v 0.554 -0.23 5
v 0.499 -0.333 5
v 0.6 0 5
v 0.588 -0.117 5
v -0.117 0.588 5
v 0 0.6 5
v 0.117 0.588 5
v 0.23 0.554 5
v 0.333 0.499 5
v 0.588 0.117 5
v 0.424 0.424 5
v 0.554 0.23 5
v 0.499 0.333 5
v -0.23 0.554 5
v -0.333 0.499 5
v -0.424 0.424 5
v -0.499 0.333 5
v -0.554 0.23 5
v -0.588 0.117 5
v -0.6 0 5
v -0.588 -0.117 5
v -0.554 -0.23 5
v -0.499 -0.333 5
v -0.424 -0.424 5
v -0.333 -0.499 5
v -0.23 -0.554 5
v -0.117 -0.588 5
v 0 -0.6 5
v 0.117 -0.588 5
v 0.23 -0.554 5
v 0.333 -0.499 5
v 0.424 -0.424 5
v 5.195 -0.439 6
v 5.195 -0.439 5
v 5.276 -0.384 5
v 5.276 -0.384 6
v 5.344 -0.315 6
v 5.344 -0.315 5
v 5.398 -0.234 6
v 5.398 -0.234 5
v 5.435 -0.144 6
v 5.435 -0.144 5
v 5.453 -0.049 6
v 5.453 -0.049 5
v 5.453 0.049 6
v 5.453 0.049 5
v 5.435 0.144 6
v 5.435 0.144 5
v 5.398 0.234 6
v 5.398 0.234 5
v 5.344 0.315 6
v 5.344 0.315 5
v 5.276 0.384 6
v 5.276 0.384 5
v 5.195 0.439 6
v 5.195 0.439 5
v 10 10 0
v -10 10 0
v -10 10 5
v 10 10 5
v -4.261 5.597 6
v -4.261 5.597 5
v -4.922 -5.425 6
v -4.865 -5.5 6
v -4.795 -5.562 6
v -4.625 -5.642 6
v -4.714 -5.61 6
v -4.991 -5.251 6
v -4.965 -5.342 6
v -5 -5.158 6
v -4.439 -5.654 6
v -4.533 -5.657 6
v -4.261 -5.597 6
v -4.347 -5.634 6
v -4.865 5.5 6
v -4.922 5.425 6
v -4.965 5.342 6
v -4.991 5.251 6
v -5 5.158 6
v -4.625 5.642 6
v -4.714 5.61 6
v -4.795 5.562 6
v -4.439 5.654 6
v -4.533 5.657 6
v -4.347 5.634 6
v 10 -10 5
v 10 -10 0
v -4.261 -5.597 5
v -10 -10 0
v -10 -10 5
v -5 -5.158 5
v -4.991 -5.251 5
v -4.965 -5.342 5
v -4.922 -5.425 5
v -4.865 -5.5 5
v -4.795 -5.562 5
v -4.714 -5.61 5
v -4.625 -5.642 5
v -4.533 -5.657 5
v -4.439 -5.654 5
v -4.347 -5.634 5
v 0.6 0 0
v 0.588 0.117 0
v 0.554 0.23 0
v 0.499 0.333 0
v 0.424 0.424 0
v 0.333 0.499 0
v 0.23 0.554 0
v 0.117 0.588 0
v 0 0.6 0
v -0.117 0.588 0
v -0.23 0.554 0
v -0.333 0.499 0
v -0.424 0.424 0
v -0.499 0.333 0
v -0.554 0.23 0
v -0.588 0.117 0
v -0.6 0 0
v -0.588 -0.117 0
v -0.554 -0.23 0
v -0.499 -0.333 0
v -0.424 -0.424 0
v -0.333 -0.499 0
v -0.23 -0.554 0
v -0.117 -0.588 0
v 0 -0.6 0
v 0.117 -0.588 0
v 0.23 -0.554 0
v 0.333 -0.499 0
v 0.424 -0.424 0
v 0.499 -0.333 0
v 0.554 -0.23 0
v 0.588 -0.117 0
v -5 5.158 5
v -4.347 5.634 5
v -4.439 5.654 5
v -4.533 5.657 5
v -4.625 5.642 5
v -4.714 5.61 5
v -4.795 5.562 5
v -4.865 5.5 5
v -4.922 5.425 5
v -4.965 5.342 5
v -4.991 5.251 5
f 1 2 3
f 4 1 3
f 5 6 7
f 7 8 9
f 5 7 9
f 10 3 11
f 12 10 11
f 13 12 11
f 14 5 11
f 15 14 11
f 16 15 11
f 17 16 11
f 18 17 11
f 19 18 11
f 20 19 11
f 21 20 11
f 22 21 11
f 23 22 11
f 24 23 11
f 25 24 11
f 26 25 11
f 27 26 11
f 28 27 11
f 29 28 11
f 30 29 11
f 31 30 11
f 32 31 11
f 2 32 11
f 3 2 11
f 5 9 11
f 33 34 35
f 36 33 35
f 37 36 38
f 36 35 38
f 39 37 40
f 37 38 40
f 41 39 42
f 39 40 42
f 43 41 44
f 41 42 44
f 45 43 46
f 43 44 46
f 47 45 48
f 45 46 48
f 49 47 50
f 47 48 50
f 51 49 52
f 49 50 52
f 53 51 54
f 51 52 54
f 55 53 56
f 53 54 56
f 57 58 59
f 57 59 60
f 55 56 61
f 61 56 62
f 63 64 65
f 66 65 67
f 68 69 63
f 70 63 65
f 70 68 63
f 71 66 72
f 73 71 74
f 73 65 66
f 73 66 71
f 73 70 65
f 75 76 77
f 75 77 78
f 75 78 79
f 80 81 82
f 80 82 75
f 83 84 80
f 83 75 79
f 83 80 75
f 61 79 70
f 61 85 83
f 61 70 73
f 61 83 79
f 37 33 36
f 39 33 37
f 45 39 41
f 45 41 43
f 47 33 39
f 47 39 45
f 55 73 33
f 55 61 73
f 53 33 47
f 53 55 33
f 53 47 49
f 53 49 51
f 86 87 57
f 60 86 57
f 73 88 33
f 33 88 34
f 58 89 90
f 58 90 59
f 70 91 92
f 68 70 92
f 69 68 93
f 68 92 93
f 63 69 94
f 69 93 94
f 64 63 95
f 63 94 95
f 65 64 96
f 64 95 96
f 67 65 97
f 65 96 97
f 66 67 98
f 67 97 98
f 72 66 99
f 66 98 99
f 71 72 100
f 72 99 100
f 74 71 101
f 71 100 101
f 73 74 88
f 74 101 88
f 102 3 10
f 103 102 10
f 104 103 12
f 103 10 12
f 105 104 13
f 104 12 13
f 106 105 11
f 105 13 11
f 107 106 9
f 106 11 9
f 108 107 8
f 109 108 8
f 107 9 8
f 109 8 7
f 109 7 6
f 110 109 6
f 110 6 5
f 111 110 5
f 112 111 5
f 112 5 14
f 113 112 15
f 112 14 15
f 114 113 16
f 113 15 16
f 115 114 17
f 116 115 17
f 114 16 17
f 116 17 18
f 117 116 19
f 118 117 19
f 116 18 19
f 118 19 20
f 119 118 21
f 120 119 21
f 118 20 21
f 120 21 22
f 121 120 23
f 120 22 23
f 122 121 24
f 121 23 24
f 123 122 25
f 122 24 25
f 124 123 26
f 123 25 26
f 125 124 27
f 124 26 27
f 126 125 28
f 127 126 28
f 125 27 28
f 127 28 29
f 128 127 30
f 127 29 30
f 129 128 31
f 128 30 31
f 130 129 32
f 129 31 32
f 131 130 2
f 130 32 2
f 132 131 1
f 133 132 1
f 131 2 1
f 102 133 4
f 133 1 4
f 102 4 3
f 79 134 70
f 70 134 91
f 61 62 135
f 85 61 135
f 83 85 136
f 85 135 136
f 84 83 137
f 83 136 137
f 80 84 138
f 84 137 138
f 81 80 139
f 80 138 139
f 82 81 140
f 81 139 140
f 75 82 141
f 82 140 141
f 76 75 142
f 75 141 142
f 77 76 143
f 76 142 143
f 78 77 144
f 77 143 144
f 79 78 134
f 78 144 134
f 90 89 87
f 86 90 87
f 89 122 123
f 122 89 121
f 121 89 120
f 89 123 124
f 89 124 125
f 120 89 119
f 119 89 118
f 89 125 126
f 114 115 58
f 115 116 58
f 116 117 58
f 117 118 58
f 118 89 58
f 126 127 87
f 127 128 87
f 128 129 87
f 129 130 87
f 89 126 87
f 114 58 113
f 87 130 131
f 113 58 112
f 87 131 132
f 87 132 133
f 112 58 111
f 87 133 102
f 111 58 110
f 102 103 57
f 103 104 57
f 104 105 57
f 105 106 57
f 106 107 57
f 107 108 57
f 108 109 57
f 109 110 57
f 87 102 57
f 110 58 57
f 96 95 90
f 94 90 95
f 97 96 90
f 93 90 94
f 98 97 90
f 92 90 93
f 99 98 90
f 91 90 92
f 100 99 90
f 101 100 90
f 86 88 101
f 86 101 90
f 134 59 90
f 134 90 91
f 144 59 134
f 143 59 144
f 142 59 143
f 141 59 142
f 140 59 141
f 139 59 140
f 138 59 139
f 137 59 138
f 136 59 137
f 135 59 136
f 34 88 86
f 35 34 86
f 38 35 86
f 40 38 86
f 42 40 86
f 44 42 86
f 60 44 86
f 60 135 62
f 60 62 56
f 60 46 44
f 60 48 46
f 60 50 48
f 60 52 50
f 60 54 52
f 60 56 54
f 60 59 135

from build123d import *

# Parameters (mm, degrees)
SKETCH1_W           = 20
SKETCH1_H           = 20
BOSS_EXTRUDE1_DEPTH = 5
SKETCH6_R           = 0.6
CUT_EXTRUDE1_DEPTH  = 5
BOSS_EXTRUDE2_DEPTH = 1


with BuildPart() as part:
    # Sketch1 → Boss-Extrude1 (new body)
    with BuildSketch(Plane.XY):
        Rectangle(SKETCH1_W, SKETCH1_H)
    extrude(amount=BOSS_EXTRUDE1_DEPTH)

    # Sketch6 → Cut-Extrude1 (cut)
    with BuildSketch(Plane.XY.offset(5)):
        Circle(SKETCH6_R)
    extrude(amount=-CUT_EXTRUDE1_DEPTH, mode=Mode.SUBTRACT)

    # Sketch2 → Boss-Extrude2 (add)
    with BuildSketch(Plane.XY.offset(5)):
        with BuildLine():
            Line((-5, 5.157728905), (-5, -5.157728905))
            ThreePointArc((-5, -5.157728905), (-4.755232215, -5.58767834), (-4.260573935, -5.596676692))
            Line((-4.260573935, -5.596676692), (5.195262391, -0.438947786))
            ThreePointArc((5.195262391, -0.438947786), (5.455836326, 0), (5.195262391, 0.438947786))
            Line((5.195262391, 0.438947786), (-4.260573935, 5.596676692))
            ThreePointArc((-4.260573935, 5.596676692), (-4.755232215, 5.58767834), (-5, 5.157728905))
        make_face()
    extrude(amount=BOSS_EXTRUDE2_DEPTH)


solid = part.part
